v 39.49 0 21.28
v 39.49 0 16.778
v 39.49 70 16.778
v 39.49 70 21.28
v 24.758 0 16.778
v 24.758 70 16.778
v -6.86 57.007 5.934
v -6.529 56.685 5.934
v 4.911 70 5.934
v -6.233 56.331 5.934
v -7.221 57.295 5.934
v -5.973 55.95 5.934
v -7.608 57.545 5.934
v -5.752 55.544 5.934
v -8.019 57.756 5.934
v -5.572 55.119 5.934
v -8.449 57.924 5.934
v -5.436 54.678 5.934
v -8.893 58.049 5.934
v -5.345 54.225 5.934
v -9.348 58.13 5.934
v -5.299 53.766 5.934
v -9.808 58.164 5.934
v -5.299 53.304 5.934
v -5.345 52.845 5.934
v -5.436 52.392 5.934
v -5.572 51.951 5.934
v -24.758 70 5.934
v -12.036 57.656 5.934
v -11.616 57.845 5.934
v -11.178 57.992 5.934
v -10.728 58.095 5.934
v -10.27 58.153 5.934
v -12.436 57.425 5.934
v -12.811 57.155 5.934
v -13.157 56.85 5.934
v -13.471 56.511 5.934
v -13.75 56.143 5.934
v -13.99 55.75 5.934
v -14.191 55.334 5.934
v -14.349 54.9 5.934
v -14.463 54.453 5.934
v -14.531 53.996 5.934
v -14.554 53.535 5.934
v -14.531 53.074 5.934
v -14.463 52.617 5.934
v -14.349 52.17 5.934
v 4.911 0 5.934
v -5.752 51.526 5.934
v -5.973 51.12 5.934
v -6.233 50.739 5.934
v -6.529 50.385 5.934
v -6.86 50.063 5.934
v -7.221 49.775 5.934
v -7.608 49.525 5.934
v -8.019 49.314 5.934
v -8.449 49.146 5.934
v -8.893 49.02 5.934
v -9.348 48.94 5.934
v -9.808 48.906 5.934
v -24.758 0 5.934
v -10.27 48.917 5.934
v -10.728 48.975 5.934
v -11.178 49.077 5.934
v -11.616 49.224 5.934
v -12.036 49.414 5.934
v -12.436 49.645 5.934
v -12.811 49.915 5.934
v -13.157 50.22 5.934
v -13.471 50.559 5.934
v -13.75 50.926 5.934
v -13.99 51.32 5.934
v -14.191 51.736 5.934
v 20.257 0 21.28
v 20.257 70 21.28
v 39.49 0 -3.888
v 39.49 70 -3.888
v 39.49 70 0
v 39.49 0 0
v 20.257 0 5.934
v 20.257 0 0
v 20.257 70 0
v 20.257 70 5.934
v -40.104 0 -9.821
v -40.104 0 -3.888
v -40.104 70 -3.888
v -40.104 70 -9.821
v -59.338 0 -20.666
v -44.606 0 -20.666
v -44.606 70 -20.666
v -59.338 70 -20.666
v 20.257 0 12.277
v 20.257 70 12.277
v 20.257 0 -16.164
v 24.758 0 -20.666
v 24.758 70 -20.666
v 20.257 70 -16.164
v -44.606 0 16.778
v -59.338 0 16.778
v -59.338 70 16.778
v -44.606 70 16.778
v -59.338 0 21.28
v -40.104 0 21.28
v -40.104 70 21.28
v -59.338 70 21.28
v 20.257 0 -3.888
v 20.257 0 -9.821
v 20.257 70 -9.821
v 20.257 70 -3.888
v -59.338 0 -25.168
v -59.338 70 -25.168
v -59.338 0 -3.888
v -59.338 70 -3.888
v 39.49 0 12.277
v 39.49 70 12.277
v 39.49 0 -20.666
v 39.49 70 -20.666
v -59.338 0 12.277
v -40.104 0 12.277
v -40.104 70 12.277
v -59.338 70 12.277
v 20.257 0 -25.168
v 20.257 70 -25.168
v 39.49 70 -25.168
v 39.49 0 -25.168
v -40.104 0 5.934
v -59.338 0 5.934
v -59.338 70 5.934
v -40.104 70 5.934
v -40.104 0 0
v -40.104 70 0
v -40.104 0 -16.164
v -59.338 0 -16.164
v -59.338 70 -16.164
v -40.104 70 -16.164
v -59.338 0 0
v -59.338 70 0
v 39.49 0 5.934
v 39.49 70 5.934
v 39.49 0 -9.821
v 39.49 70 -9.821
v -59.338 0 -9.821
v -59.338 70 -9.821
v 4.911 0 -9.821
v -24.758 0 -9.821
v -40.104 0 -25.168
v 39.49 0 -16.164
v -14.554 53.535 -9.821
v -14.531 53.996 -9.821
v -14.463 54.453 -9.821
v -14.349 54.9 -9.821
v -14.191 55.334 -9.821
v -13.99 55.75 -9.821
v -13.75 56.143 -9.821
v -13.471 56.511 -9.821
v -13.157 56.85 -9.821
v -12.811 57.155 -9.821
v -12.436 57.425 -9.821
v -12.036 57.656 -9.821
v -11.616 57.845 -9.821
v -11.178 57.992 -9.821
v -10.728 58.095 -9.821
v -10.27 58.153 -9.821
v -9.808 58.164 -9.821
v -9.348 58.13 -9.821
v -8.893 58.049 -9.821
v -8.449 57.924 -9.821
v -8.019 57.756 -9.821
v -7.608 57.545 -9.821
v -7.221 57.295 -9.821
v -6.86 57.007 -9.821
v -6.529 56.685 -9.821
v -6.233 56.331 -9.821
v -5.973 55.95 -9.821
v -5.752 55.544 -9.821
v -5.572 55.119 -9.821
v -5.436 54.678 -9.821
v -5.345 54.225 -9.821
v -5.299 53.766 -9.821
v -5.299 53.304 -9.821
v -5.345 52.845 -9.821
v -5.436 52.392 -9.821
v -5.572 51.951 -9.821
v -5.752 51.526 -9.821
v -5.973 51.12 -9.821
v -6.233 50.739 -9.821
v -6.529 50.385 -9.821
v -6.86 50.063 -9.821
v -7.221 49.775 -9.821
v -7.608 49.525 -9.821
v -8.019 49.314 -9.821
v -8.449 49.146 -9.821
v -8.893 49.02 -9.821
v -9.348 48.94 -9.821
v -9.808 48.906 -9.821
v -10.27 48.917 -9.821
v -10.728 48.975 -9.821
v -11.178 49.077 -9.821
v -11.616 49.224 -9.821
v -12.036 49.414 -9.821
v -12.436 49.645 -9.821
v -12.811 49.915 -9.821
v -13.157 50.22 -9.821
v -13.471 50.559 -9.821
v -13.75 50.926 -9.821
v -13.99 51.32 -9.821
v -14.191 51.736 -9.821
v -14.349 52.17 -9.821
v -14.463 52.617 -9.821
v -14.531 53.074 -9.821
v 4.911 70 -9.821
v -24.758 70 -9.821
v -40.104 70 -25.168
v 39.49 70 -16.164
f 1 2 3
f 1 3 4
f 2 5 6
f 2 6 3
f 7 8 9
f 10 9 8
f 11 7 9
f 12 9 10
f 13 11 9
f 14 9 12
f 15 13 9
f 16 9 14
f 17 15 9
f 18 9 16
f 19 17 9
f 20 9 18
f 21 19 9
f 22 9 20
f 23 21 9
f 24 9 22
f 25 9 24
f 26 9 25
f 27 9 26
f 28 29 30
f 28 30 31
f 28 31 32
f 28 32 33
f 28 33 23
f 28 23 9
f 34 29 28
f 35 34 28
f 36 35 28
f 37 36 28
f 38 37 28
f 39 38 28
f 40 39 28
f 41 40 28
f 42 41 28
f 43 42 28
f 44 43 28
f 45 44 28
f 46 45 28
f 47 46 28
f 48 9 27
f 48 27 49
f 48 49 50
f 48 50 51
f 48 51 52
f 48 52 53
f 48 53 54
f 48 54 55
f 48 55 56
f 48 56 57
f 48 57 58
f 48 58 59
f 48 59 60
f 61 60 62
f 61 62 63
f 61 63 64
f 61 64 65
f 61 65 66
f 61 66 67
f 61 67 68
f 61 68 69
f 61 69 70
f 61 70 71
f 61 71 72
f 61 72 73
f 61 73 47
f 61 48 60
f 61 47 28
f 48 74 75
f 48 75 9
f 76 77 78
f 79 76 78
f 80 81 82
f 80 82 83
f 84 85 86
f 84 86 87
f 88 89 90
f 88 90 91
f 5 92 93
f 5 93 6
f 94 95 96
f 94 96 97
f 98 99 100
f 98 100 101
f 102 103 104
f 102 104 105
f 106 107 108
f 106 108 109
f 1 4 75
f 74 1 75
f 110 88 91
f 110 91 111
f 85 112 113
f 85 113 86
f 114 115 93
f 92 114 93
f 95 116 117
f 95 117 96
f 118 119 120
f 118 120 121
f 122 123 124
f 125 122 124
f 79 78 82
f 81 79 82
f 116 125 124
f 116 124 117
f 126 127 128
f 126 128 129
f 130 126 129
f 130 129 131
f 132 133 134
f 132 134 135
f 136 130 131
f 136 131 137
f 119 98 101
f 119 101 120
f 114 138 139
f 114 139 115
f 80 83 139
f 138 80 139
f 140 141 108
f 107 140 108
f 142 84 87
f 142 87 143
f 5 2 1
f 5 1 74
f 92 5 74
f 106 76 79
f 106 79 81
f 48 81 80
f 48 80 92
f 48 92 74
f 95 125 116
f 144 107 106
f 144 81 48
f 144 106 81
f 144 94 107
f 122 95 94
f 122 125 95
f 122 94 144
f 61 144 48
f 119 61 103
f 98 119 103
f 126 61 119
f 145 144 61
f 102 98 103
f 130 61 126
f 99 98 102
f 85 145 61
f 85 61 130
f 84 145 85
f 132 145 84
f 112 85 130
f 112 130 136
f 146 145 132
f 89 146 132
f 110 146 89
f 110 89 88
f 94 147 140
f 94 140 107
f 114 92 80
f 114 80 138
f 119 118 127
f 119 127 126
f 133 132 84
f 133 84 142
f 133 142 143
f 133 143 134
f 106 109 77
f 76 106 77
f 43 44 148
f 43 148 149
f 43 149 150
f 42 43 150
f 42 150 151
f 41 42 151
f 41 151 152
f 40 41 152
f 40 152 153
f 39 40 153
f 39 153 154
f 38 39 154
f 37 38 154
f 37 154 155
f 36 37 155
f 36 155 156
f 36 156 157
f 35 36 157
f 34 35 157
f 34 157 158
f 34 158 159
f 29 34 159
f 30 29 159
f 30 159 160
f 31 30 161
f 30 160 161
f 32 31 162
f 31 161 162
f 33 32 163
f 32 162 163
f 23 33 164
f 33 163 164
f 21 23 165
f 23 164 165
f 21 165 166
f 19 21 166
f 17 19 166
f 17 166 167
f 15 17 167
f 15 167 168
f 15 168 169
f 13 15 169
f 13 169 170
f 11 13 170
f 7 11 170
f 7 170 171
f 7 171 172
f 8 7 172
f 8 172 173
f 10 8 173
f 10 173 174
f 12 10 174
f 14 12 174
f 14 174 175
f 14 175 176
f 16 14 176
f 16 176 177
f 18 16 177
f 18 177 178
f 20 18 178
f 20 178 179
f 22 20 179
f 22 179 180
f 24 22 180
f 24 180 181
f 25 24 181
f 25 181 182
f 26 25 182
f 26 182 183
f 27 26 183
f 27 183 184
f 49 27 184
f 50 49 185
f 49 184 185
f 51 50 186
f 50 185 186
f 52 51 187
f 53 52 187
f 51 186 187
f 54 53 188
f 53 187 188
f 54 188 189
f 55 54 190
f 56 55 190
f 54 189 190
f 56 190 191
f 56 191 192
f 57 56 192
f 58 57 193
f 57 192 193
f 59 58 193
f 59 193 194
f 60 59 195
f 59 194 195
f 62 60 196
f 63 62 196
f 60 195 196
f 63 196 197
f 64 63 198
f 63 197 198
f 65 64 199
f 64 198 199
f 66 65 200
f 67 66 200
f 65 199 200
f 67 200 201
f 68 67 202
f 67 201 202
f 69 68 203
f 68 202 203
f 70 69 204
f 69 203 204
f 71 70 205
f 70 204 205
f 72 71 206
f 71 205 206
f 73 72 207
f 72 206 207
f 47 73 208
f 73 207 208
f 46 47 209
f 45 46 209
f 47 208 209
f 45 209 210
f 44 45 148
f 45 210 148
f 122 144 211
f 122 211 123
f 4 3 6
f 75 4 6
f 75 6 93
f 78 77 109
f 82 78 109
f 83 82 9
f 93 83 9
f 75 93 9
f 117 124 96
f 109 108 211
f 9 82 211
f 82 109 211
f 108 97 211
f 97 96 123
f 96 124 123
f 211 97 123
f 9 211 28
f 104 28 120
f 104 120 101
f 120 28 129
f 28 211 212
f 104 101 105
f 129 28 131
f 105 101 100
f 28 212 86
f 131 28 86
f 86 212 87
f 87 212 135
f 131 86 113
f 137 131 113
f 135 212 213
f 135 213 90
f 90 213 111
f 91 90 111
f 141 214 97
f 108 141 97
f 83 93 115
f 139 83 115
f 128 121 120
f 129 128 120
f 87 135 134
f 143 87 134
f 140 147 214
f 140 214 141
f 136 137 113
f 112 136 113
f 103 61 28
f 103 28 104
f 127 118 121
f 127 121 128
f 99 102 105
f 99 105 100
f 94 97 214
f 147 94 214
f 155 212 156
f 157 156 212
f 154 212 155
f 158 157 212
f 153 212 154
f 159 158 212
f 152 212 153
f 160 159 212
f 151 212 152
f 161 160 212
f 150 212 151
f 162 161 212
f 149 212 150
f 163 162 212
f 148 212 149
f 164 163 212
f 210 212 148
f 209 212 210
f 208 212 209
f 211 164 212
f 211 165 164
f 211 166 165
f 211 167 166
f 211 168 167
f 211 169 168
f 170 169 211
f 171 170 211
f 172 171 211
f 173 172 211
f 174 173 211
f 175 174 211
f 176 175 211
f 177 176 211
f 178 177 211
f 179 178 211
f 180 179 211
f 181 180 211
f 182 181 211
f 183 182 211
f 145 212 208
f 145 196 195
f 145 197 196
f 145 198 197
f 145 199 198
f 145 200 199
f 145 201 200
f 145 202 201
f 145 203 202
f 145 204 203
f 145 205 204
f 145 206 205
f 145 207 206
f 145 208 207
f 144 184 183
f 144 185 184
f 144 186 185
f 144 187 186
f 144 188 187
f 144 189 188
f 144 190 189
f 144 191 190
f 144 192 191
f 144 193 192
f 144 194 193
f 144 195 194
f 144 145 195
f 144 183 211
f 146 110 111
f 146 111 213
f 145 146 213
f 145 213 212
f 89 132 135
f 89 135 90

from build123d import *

# Parameters (mm, degrees)
BOSS_EXTRUDE1_DEPTH = 70
SKETCH3_R           = 4.630574493
CUT_EXTRUDE1_DEPTH  = 97.893202961


with BuildPart() as part:
    # Sketch1 → Boss-Extrude1 (new body)
    with BuildSketch(Plane(origin=(0, 0, 0), x_dir=(1, 0, 0), z_dir=(0, 1, 0))):
        Polygon((-59.338025707, 25.167507455), (-40.104320822, 25.167507455), (-24.758279691, 9.821466324), (4.910733162, 9.821466324), (20.256774293, 25.167507455), (39.490479177, 25.167507455), (39.490479177, 20.666002056), (24.758279691, 20.666002056), (20.256774293, 16.164496658), (39.490479177, 16.164496658), (39.490479177, 9.821466324), (20.256774293, 9.821466324), (20.256774293, 3.887663753), (39.490479177, 3.887663753), (39.490479177, 0), (20.256774293, 0), (20.256774293, -5.933802571), (39.490479177, -5.933802571), (39.490479177, -12.276832905), (20.256774293, -12.276832905), (24.758279691, -16.778338303), (39.490479177, -16.778338303), (39.490479177, -21.279843702), (20.256774293, -21.279843702), (4.910733162, -5.933802571), (-24.758279691, -5.933802571), (-40.104320822, -21.279843702), (-59.338025707, -21.279843702), (-59.338025707, -16.778338303), (-44.605826221, -16.778338303), (-40.104320822, -12.276832905), (-59.338025707, -12.276832905), (-59.338025707, -5.933802571), (-40.104320822, -5.933802571), (-40.104320822, 0), (-59.338025707, 0), (-59.338025707, 3.887663753), (-40.104320822, 3.887663753), (-40.104320822, 9.821466324), (-59.338025707, 9.821466324), (-59.338025707, 16.164496658), (-40.104320822, 16.164496658), (-44.605826221, 20.666002056), (-59.338025707, 20.666002056), align=None)
    extrude(amount=BOSS_EXTRUDE1_DEPTH)

    # Sketch3 → Cut-Extrude1 (cut, through all)
    with BuildSketch(Plane(origin=(0, 0, -9.821466324), x_dir=(-1, 0, 0), z_dir=(0, 0, -1))):
        with Locations((9.923773265, 53.534976089)):
            Circle(SKETCH3_R)
    extrude(amount=-CUT_EXTRUDE1_DEPTH, mode=Mode.SUBTRACT)


solid = part.part
